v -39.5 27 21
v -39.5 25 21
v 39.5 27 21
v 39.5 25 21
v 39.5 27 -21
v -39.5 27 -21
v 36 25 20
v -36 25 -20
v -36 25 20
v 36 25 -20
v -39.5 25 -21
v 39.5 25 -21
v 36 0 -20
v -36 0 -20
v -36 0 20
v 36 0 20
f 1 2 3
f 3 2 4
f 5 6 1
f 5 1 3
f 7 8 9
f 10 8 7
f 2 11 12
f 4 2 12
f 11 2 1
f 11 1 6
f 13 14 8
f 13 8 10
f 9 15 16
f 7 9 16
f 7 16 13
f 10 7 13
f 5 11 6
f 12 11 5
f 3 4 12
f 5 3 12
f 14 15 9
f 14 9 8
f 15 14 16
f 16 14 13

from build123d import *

# Parameters (mm, degrees)
SKETCH_1_W      = 72
SKETCH_1_H      = 40
EXTRUDE_1_DEPTH = 25
EXTRUDE_START   = 25
SKETCH_1_4_W    = 79
SKETCH_1_4_H    = 42
EXTRUDE_3_DEPTH = 2


with BuildPart() as part:
    # 草图1 → 凸台-拉伸1 (new body)
    with BuildSketch(Plane(origin=(0, 0, 0), x_dir=(1, 0, 0), z_dir=(0, 1, 0))):
        Rectangle(SKETCH_1_W, SKETCH_1_H)
    extrude(amount=EXTRUDE_1_DEPTH)


with BuildPart() as body_2:
    # 草图1<4> → 凸台-拉伸3 (new body)
    with BuildSketch(Plane(origin=(0, 0, 0), x_dir=(1, 0, 0), z_dir=(0, 1, 0)).offset(EXTRUDE_START)):
        Rectangle(SKETCH_1_4_W, SKETCH_1_4_H)
    extrude(amount=EXTRUDE_3_DEPTH)


solid = Compound([part.part, body_2.part])
